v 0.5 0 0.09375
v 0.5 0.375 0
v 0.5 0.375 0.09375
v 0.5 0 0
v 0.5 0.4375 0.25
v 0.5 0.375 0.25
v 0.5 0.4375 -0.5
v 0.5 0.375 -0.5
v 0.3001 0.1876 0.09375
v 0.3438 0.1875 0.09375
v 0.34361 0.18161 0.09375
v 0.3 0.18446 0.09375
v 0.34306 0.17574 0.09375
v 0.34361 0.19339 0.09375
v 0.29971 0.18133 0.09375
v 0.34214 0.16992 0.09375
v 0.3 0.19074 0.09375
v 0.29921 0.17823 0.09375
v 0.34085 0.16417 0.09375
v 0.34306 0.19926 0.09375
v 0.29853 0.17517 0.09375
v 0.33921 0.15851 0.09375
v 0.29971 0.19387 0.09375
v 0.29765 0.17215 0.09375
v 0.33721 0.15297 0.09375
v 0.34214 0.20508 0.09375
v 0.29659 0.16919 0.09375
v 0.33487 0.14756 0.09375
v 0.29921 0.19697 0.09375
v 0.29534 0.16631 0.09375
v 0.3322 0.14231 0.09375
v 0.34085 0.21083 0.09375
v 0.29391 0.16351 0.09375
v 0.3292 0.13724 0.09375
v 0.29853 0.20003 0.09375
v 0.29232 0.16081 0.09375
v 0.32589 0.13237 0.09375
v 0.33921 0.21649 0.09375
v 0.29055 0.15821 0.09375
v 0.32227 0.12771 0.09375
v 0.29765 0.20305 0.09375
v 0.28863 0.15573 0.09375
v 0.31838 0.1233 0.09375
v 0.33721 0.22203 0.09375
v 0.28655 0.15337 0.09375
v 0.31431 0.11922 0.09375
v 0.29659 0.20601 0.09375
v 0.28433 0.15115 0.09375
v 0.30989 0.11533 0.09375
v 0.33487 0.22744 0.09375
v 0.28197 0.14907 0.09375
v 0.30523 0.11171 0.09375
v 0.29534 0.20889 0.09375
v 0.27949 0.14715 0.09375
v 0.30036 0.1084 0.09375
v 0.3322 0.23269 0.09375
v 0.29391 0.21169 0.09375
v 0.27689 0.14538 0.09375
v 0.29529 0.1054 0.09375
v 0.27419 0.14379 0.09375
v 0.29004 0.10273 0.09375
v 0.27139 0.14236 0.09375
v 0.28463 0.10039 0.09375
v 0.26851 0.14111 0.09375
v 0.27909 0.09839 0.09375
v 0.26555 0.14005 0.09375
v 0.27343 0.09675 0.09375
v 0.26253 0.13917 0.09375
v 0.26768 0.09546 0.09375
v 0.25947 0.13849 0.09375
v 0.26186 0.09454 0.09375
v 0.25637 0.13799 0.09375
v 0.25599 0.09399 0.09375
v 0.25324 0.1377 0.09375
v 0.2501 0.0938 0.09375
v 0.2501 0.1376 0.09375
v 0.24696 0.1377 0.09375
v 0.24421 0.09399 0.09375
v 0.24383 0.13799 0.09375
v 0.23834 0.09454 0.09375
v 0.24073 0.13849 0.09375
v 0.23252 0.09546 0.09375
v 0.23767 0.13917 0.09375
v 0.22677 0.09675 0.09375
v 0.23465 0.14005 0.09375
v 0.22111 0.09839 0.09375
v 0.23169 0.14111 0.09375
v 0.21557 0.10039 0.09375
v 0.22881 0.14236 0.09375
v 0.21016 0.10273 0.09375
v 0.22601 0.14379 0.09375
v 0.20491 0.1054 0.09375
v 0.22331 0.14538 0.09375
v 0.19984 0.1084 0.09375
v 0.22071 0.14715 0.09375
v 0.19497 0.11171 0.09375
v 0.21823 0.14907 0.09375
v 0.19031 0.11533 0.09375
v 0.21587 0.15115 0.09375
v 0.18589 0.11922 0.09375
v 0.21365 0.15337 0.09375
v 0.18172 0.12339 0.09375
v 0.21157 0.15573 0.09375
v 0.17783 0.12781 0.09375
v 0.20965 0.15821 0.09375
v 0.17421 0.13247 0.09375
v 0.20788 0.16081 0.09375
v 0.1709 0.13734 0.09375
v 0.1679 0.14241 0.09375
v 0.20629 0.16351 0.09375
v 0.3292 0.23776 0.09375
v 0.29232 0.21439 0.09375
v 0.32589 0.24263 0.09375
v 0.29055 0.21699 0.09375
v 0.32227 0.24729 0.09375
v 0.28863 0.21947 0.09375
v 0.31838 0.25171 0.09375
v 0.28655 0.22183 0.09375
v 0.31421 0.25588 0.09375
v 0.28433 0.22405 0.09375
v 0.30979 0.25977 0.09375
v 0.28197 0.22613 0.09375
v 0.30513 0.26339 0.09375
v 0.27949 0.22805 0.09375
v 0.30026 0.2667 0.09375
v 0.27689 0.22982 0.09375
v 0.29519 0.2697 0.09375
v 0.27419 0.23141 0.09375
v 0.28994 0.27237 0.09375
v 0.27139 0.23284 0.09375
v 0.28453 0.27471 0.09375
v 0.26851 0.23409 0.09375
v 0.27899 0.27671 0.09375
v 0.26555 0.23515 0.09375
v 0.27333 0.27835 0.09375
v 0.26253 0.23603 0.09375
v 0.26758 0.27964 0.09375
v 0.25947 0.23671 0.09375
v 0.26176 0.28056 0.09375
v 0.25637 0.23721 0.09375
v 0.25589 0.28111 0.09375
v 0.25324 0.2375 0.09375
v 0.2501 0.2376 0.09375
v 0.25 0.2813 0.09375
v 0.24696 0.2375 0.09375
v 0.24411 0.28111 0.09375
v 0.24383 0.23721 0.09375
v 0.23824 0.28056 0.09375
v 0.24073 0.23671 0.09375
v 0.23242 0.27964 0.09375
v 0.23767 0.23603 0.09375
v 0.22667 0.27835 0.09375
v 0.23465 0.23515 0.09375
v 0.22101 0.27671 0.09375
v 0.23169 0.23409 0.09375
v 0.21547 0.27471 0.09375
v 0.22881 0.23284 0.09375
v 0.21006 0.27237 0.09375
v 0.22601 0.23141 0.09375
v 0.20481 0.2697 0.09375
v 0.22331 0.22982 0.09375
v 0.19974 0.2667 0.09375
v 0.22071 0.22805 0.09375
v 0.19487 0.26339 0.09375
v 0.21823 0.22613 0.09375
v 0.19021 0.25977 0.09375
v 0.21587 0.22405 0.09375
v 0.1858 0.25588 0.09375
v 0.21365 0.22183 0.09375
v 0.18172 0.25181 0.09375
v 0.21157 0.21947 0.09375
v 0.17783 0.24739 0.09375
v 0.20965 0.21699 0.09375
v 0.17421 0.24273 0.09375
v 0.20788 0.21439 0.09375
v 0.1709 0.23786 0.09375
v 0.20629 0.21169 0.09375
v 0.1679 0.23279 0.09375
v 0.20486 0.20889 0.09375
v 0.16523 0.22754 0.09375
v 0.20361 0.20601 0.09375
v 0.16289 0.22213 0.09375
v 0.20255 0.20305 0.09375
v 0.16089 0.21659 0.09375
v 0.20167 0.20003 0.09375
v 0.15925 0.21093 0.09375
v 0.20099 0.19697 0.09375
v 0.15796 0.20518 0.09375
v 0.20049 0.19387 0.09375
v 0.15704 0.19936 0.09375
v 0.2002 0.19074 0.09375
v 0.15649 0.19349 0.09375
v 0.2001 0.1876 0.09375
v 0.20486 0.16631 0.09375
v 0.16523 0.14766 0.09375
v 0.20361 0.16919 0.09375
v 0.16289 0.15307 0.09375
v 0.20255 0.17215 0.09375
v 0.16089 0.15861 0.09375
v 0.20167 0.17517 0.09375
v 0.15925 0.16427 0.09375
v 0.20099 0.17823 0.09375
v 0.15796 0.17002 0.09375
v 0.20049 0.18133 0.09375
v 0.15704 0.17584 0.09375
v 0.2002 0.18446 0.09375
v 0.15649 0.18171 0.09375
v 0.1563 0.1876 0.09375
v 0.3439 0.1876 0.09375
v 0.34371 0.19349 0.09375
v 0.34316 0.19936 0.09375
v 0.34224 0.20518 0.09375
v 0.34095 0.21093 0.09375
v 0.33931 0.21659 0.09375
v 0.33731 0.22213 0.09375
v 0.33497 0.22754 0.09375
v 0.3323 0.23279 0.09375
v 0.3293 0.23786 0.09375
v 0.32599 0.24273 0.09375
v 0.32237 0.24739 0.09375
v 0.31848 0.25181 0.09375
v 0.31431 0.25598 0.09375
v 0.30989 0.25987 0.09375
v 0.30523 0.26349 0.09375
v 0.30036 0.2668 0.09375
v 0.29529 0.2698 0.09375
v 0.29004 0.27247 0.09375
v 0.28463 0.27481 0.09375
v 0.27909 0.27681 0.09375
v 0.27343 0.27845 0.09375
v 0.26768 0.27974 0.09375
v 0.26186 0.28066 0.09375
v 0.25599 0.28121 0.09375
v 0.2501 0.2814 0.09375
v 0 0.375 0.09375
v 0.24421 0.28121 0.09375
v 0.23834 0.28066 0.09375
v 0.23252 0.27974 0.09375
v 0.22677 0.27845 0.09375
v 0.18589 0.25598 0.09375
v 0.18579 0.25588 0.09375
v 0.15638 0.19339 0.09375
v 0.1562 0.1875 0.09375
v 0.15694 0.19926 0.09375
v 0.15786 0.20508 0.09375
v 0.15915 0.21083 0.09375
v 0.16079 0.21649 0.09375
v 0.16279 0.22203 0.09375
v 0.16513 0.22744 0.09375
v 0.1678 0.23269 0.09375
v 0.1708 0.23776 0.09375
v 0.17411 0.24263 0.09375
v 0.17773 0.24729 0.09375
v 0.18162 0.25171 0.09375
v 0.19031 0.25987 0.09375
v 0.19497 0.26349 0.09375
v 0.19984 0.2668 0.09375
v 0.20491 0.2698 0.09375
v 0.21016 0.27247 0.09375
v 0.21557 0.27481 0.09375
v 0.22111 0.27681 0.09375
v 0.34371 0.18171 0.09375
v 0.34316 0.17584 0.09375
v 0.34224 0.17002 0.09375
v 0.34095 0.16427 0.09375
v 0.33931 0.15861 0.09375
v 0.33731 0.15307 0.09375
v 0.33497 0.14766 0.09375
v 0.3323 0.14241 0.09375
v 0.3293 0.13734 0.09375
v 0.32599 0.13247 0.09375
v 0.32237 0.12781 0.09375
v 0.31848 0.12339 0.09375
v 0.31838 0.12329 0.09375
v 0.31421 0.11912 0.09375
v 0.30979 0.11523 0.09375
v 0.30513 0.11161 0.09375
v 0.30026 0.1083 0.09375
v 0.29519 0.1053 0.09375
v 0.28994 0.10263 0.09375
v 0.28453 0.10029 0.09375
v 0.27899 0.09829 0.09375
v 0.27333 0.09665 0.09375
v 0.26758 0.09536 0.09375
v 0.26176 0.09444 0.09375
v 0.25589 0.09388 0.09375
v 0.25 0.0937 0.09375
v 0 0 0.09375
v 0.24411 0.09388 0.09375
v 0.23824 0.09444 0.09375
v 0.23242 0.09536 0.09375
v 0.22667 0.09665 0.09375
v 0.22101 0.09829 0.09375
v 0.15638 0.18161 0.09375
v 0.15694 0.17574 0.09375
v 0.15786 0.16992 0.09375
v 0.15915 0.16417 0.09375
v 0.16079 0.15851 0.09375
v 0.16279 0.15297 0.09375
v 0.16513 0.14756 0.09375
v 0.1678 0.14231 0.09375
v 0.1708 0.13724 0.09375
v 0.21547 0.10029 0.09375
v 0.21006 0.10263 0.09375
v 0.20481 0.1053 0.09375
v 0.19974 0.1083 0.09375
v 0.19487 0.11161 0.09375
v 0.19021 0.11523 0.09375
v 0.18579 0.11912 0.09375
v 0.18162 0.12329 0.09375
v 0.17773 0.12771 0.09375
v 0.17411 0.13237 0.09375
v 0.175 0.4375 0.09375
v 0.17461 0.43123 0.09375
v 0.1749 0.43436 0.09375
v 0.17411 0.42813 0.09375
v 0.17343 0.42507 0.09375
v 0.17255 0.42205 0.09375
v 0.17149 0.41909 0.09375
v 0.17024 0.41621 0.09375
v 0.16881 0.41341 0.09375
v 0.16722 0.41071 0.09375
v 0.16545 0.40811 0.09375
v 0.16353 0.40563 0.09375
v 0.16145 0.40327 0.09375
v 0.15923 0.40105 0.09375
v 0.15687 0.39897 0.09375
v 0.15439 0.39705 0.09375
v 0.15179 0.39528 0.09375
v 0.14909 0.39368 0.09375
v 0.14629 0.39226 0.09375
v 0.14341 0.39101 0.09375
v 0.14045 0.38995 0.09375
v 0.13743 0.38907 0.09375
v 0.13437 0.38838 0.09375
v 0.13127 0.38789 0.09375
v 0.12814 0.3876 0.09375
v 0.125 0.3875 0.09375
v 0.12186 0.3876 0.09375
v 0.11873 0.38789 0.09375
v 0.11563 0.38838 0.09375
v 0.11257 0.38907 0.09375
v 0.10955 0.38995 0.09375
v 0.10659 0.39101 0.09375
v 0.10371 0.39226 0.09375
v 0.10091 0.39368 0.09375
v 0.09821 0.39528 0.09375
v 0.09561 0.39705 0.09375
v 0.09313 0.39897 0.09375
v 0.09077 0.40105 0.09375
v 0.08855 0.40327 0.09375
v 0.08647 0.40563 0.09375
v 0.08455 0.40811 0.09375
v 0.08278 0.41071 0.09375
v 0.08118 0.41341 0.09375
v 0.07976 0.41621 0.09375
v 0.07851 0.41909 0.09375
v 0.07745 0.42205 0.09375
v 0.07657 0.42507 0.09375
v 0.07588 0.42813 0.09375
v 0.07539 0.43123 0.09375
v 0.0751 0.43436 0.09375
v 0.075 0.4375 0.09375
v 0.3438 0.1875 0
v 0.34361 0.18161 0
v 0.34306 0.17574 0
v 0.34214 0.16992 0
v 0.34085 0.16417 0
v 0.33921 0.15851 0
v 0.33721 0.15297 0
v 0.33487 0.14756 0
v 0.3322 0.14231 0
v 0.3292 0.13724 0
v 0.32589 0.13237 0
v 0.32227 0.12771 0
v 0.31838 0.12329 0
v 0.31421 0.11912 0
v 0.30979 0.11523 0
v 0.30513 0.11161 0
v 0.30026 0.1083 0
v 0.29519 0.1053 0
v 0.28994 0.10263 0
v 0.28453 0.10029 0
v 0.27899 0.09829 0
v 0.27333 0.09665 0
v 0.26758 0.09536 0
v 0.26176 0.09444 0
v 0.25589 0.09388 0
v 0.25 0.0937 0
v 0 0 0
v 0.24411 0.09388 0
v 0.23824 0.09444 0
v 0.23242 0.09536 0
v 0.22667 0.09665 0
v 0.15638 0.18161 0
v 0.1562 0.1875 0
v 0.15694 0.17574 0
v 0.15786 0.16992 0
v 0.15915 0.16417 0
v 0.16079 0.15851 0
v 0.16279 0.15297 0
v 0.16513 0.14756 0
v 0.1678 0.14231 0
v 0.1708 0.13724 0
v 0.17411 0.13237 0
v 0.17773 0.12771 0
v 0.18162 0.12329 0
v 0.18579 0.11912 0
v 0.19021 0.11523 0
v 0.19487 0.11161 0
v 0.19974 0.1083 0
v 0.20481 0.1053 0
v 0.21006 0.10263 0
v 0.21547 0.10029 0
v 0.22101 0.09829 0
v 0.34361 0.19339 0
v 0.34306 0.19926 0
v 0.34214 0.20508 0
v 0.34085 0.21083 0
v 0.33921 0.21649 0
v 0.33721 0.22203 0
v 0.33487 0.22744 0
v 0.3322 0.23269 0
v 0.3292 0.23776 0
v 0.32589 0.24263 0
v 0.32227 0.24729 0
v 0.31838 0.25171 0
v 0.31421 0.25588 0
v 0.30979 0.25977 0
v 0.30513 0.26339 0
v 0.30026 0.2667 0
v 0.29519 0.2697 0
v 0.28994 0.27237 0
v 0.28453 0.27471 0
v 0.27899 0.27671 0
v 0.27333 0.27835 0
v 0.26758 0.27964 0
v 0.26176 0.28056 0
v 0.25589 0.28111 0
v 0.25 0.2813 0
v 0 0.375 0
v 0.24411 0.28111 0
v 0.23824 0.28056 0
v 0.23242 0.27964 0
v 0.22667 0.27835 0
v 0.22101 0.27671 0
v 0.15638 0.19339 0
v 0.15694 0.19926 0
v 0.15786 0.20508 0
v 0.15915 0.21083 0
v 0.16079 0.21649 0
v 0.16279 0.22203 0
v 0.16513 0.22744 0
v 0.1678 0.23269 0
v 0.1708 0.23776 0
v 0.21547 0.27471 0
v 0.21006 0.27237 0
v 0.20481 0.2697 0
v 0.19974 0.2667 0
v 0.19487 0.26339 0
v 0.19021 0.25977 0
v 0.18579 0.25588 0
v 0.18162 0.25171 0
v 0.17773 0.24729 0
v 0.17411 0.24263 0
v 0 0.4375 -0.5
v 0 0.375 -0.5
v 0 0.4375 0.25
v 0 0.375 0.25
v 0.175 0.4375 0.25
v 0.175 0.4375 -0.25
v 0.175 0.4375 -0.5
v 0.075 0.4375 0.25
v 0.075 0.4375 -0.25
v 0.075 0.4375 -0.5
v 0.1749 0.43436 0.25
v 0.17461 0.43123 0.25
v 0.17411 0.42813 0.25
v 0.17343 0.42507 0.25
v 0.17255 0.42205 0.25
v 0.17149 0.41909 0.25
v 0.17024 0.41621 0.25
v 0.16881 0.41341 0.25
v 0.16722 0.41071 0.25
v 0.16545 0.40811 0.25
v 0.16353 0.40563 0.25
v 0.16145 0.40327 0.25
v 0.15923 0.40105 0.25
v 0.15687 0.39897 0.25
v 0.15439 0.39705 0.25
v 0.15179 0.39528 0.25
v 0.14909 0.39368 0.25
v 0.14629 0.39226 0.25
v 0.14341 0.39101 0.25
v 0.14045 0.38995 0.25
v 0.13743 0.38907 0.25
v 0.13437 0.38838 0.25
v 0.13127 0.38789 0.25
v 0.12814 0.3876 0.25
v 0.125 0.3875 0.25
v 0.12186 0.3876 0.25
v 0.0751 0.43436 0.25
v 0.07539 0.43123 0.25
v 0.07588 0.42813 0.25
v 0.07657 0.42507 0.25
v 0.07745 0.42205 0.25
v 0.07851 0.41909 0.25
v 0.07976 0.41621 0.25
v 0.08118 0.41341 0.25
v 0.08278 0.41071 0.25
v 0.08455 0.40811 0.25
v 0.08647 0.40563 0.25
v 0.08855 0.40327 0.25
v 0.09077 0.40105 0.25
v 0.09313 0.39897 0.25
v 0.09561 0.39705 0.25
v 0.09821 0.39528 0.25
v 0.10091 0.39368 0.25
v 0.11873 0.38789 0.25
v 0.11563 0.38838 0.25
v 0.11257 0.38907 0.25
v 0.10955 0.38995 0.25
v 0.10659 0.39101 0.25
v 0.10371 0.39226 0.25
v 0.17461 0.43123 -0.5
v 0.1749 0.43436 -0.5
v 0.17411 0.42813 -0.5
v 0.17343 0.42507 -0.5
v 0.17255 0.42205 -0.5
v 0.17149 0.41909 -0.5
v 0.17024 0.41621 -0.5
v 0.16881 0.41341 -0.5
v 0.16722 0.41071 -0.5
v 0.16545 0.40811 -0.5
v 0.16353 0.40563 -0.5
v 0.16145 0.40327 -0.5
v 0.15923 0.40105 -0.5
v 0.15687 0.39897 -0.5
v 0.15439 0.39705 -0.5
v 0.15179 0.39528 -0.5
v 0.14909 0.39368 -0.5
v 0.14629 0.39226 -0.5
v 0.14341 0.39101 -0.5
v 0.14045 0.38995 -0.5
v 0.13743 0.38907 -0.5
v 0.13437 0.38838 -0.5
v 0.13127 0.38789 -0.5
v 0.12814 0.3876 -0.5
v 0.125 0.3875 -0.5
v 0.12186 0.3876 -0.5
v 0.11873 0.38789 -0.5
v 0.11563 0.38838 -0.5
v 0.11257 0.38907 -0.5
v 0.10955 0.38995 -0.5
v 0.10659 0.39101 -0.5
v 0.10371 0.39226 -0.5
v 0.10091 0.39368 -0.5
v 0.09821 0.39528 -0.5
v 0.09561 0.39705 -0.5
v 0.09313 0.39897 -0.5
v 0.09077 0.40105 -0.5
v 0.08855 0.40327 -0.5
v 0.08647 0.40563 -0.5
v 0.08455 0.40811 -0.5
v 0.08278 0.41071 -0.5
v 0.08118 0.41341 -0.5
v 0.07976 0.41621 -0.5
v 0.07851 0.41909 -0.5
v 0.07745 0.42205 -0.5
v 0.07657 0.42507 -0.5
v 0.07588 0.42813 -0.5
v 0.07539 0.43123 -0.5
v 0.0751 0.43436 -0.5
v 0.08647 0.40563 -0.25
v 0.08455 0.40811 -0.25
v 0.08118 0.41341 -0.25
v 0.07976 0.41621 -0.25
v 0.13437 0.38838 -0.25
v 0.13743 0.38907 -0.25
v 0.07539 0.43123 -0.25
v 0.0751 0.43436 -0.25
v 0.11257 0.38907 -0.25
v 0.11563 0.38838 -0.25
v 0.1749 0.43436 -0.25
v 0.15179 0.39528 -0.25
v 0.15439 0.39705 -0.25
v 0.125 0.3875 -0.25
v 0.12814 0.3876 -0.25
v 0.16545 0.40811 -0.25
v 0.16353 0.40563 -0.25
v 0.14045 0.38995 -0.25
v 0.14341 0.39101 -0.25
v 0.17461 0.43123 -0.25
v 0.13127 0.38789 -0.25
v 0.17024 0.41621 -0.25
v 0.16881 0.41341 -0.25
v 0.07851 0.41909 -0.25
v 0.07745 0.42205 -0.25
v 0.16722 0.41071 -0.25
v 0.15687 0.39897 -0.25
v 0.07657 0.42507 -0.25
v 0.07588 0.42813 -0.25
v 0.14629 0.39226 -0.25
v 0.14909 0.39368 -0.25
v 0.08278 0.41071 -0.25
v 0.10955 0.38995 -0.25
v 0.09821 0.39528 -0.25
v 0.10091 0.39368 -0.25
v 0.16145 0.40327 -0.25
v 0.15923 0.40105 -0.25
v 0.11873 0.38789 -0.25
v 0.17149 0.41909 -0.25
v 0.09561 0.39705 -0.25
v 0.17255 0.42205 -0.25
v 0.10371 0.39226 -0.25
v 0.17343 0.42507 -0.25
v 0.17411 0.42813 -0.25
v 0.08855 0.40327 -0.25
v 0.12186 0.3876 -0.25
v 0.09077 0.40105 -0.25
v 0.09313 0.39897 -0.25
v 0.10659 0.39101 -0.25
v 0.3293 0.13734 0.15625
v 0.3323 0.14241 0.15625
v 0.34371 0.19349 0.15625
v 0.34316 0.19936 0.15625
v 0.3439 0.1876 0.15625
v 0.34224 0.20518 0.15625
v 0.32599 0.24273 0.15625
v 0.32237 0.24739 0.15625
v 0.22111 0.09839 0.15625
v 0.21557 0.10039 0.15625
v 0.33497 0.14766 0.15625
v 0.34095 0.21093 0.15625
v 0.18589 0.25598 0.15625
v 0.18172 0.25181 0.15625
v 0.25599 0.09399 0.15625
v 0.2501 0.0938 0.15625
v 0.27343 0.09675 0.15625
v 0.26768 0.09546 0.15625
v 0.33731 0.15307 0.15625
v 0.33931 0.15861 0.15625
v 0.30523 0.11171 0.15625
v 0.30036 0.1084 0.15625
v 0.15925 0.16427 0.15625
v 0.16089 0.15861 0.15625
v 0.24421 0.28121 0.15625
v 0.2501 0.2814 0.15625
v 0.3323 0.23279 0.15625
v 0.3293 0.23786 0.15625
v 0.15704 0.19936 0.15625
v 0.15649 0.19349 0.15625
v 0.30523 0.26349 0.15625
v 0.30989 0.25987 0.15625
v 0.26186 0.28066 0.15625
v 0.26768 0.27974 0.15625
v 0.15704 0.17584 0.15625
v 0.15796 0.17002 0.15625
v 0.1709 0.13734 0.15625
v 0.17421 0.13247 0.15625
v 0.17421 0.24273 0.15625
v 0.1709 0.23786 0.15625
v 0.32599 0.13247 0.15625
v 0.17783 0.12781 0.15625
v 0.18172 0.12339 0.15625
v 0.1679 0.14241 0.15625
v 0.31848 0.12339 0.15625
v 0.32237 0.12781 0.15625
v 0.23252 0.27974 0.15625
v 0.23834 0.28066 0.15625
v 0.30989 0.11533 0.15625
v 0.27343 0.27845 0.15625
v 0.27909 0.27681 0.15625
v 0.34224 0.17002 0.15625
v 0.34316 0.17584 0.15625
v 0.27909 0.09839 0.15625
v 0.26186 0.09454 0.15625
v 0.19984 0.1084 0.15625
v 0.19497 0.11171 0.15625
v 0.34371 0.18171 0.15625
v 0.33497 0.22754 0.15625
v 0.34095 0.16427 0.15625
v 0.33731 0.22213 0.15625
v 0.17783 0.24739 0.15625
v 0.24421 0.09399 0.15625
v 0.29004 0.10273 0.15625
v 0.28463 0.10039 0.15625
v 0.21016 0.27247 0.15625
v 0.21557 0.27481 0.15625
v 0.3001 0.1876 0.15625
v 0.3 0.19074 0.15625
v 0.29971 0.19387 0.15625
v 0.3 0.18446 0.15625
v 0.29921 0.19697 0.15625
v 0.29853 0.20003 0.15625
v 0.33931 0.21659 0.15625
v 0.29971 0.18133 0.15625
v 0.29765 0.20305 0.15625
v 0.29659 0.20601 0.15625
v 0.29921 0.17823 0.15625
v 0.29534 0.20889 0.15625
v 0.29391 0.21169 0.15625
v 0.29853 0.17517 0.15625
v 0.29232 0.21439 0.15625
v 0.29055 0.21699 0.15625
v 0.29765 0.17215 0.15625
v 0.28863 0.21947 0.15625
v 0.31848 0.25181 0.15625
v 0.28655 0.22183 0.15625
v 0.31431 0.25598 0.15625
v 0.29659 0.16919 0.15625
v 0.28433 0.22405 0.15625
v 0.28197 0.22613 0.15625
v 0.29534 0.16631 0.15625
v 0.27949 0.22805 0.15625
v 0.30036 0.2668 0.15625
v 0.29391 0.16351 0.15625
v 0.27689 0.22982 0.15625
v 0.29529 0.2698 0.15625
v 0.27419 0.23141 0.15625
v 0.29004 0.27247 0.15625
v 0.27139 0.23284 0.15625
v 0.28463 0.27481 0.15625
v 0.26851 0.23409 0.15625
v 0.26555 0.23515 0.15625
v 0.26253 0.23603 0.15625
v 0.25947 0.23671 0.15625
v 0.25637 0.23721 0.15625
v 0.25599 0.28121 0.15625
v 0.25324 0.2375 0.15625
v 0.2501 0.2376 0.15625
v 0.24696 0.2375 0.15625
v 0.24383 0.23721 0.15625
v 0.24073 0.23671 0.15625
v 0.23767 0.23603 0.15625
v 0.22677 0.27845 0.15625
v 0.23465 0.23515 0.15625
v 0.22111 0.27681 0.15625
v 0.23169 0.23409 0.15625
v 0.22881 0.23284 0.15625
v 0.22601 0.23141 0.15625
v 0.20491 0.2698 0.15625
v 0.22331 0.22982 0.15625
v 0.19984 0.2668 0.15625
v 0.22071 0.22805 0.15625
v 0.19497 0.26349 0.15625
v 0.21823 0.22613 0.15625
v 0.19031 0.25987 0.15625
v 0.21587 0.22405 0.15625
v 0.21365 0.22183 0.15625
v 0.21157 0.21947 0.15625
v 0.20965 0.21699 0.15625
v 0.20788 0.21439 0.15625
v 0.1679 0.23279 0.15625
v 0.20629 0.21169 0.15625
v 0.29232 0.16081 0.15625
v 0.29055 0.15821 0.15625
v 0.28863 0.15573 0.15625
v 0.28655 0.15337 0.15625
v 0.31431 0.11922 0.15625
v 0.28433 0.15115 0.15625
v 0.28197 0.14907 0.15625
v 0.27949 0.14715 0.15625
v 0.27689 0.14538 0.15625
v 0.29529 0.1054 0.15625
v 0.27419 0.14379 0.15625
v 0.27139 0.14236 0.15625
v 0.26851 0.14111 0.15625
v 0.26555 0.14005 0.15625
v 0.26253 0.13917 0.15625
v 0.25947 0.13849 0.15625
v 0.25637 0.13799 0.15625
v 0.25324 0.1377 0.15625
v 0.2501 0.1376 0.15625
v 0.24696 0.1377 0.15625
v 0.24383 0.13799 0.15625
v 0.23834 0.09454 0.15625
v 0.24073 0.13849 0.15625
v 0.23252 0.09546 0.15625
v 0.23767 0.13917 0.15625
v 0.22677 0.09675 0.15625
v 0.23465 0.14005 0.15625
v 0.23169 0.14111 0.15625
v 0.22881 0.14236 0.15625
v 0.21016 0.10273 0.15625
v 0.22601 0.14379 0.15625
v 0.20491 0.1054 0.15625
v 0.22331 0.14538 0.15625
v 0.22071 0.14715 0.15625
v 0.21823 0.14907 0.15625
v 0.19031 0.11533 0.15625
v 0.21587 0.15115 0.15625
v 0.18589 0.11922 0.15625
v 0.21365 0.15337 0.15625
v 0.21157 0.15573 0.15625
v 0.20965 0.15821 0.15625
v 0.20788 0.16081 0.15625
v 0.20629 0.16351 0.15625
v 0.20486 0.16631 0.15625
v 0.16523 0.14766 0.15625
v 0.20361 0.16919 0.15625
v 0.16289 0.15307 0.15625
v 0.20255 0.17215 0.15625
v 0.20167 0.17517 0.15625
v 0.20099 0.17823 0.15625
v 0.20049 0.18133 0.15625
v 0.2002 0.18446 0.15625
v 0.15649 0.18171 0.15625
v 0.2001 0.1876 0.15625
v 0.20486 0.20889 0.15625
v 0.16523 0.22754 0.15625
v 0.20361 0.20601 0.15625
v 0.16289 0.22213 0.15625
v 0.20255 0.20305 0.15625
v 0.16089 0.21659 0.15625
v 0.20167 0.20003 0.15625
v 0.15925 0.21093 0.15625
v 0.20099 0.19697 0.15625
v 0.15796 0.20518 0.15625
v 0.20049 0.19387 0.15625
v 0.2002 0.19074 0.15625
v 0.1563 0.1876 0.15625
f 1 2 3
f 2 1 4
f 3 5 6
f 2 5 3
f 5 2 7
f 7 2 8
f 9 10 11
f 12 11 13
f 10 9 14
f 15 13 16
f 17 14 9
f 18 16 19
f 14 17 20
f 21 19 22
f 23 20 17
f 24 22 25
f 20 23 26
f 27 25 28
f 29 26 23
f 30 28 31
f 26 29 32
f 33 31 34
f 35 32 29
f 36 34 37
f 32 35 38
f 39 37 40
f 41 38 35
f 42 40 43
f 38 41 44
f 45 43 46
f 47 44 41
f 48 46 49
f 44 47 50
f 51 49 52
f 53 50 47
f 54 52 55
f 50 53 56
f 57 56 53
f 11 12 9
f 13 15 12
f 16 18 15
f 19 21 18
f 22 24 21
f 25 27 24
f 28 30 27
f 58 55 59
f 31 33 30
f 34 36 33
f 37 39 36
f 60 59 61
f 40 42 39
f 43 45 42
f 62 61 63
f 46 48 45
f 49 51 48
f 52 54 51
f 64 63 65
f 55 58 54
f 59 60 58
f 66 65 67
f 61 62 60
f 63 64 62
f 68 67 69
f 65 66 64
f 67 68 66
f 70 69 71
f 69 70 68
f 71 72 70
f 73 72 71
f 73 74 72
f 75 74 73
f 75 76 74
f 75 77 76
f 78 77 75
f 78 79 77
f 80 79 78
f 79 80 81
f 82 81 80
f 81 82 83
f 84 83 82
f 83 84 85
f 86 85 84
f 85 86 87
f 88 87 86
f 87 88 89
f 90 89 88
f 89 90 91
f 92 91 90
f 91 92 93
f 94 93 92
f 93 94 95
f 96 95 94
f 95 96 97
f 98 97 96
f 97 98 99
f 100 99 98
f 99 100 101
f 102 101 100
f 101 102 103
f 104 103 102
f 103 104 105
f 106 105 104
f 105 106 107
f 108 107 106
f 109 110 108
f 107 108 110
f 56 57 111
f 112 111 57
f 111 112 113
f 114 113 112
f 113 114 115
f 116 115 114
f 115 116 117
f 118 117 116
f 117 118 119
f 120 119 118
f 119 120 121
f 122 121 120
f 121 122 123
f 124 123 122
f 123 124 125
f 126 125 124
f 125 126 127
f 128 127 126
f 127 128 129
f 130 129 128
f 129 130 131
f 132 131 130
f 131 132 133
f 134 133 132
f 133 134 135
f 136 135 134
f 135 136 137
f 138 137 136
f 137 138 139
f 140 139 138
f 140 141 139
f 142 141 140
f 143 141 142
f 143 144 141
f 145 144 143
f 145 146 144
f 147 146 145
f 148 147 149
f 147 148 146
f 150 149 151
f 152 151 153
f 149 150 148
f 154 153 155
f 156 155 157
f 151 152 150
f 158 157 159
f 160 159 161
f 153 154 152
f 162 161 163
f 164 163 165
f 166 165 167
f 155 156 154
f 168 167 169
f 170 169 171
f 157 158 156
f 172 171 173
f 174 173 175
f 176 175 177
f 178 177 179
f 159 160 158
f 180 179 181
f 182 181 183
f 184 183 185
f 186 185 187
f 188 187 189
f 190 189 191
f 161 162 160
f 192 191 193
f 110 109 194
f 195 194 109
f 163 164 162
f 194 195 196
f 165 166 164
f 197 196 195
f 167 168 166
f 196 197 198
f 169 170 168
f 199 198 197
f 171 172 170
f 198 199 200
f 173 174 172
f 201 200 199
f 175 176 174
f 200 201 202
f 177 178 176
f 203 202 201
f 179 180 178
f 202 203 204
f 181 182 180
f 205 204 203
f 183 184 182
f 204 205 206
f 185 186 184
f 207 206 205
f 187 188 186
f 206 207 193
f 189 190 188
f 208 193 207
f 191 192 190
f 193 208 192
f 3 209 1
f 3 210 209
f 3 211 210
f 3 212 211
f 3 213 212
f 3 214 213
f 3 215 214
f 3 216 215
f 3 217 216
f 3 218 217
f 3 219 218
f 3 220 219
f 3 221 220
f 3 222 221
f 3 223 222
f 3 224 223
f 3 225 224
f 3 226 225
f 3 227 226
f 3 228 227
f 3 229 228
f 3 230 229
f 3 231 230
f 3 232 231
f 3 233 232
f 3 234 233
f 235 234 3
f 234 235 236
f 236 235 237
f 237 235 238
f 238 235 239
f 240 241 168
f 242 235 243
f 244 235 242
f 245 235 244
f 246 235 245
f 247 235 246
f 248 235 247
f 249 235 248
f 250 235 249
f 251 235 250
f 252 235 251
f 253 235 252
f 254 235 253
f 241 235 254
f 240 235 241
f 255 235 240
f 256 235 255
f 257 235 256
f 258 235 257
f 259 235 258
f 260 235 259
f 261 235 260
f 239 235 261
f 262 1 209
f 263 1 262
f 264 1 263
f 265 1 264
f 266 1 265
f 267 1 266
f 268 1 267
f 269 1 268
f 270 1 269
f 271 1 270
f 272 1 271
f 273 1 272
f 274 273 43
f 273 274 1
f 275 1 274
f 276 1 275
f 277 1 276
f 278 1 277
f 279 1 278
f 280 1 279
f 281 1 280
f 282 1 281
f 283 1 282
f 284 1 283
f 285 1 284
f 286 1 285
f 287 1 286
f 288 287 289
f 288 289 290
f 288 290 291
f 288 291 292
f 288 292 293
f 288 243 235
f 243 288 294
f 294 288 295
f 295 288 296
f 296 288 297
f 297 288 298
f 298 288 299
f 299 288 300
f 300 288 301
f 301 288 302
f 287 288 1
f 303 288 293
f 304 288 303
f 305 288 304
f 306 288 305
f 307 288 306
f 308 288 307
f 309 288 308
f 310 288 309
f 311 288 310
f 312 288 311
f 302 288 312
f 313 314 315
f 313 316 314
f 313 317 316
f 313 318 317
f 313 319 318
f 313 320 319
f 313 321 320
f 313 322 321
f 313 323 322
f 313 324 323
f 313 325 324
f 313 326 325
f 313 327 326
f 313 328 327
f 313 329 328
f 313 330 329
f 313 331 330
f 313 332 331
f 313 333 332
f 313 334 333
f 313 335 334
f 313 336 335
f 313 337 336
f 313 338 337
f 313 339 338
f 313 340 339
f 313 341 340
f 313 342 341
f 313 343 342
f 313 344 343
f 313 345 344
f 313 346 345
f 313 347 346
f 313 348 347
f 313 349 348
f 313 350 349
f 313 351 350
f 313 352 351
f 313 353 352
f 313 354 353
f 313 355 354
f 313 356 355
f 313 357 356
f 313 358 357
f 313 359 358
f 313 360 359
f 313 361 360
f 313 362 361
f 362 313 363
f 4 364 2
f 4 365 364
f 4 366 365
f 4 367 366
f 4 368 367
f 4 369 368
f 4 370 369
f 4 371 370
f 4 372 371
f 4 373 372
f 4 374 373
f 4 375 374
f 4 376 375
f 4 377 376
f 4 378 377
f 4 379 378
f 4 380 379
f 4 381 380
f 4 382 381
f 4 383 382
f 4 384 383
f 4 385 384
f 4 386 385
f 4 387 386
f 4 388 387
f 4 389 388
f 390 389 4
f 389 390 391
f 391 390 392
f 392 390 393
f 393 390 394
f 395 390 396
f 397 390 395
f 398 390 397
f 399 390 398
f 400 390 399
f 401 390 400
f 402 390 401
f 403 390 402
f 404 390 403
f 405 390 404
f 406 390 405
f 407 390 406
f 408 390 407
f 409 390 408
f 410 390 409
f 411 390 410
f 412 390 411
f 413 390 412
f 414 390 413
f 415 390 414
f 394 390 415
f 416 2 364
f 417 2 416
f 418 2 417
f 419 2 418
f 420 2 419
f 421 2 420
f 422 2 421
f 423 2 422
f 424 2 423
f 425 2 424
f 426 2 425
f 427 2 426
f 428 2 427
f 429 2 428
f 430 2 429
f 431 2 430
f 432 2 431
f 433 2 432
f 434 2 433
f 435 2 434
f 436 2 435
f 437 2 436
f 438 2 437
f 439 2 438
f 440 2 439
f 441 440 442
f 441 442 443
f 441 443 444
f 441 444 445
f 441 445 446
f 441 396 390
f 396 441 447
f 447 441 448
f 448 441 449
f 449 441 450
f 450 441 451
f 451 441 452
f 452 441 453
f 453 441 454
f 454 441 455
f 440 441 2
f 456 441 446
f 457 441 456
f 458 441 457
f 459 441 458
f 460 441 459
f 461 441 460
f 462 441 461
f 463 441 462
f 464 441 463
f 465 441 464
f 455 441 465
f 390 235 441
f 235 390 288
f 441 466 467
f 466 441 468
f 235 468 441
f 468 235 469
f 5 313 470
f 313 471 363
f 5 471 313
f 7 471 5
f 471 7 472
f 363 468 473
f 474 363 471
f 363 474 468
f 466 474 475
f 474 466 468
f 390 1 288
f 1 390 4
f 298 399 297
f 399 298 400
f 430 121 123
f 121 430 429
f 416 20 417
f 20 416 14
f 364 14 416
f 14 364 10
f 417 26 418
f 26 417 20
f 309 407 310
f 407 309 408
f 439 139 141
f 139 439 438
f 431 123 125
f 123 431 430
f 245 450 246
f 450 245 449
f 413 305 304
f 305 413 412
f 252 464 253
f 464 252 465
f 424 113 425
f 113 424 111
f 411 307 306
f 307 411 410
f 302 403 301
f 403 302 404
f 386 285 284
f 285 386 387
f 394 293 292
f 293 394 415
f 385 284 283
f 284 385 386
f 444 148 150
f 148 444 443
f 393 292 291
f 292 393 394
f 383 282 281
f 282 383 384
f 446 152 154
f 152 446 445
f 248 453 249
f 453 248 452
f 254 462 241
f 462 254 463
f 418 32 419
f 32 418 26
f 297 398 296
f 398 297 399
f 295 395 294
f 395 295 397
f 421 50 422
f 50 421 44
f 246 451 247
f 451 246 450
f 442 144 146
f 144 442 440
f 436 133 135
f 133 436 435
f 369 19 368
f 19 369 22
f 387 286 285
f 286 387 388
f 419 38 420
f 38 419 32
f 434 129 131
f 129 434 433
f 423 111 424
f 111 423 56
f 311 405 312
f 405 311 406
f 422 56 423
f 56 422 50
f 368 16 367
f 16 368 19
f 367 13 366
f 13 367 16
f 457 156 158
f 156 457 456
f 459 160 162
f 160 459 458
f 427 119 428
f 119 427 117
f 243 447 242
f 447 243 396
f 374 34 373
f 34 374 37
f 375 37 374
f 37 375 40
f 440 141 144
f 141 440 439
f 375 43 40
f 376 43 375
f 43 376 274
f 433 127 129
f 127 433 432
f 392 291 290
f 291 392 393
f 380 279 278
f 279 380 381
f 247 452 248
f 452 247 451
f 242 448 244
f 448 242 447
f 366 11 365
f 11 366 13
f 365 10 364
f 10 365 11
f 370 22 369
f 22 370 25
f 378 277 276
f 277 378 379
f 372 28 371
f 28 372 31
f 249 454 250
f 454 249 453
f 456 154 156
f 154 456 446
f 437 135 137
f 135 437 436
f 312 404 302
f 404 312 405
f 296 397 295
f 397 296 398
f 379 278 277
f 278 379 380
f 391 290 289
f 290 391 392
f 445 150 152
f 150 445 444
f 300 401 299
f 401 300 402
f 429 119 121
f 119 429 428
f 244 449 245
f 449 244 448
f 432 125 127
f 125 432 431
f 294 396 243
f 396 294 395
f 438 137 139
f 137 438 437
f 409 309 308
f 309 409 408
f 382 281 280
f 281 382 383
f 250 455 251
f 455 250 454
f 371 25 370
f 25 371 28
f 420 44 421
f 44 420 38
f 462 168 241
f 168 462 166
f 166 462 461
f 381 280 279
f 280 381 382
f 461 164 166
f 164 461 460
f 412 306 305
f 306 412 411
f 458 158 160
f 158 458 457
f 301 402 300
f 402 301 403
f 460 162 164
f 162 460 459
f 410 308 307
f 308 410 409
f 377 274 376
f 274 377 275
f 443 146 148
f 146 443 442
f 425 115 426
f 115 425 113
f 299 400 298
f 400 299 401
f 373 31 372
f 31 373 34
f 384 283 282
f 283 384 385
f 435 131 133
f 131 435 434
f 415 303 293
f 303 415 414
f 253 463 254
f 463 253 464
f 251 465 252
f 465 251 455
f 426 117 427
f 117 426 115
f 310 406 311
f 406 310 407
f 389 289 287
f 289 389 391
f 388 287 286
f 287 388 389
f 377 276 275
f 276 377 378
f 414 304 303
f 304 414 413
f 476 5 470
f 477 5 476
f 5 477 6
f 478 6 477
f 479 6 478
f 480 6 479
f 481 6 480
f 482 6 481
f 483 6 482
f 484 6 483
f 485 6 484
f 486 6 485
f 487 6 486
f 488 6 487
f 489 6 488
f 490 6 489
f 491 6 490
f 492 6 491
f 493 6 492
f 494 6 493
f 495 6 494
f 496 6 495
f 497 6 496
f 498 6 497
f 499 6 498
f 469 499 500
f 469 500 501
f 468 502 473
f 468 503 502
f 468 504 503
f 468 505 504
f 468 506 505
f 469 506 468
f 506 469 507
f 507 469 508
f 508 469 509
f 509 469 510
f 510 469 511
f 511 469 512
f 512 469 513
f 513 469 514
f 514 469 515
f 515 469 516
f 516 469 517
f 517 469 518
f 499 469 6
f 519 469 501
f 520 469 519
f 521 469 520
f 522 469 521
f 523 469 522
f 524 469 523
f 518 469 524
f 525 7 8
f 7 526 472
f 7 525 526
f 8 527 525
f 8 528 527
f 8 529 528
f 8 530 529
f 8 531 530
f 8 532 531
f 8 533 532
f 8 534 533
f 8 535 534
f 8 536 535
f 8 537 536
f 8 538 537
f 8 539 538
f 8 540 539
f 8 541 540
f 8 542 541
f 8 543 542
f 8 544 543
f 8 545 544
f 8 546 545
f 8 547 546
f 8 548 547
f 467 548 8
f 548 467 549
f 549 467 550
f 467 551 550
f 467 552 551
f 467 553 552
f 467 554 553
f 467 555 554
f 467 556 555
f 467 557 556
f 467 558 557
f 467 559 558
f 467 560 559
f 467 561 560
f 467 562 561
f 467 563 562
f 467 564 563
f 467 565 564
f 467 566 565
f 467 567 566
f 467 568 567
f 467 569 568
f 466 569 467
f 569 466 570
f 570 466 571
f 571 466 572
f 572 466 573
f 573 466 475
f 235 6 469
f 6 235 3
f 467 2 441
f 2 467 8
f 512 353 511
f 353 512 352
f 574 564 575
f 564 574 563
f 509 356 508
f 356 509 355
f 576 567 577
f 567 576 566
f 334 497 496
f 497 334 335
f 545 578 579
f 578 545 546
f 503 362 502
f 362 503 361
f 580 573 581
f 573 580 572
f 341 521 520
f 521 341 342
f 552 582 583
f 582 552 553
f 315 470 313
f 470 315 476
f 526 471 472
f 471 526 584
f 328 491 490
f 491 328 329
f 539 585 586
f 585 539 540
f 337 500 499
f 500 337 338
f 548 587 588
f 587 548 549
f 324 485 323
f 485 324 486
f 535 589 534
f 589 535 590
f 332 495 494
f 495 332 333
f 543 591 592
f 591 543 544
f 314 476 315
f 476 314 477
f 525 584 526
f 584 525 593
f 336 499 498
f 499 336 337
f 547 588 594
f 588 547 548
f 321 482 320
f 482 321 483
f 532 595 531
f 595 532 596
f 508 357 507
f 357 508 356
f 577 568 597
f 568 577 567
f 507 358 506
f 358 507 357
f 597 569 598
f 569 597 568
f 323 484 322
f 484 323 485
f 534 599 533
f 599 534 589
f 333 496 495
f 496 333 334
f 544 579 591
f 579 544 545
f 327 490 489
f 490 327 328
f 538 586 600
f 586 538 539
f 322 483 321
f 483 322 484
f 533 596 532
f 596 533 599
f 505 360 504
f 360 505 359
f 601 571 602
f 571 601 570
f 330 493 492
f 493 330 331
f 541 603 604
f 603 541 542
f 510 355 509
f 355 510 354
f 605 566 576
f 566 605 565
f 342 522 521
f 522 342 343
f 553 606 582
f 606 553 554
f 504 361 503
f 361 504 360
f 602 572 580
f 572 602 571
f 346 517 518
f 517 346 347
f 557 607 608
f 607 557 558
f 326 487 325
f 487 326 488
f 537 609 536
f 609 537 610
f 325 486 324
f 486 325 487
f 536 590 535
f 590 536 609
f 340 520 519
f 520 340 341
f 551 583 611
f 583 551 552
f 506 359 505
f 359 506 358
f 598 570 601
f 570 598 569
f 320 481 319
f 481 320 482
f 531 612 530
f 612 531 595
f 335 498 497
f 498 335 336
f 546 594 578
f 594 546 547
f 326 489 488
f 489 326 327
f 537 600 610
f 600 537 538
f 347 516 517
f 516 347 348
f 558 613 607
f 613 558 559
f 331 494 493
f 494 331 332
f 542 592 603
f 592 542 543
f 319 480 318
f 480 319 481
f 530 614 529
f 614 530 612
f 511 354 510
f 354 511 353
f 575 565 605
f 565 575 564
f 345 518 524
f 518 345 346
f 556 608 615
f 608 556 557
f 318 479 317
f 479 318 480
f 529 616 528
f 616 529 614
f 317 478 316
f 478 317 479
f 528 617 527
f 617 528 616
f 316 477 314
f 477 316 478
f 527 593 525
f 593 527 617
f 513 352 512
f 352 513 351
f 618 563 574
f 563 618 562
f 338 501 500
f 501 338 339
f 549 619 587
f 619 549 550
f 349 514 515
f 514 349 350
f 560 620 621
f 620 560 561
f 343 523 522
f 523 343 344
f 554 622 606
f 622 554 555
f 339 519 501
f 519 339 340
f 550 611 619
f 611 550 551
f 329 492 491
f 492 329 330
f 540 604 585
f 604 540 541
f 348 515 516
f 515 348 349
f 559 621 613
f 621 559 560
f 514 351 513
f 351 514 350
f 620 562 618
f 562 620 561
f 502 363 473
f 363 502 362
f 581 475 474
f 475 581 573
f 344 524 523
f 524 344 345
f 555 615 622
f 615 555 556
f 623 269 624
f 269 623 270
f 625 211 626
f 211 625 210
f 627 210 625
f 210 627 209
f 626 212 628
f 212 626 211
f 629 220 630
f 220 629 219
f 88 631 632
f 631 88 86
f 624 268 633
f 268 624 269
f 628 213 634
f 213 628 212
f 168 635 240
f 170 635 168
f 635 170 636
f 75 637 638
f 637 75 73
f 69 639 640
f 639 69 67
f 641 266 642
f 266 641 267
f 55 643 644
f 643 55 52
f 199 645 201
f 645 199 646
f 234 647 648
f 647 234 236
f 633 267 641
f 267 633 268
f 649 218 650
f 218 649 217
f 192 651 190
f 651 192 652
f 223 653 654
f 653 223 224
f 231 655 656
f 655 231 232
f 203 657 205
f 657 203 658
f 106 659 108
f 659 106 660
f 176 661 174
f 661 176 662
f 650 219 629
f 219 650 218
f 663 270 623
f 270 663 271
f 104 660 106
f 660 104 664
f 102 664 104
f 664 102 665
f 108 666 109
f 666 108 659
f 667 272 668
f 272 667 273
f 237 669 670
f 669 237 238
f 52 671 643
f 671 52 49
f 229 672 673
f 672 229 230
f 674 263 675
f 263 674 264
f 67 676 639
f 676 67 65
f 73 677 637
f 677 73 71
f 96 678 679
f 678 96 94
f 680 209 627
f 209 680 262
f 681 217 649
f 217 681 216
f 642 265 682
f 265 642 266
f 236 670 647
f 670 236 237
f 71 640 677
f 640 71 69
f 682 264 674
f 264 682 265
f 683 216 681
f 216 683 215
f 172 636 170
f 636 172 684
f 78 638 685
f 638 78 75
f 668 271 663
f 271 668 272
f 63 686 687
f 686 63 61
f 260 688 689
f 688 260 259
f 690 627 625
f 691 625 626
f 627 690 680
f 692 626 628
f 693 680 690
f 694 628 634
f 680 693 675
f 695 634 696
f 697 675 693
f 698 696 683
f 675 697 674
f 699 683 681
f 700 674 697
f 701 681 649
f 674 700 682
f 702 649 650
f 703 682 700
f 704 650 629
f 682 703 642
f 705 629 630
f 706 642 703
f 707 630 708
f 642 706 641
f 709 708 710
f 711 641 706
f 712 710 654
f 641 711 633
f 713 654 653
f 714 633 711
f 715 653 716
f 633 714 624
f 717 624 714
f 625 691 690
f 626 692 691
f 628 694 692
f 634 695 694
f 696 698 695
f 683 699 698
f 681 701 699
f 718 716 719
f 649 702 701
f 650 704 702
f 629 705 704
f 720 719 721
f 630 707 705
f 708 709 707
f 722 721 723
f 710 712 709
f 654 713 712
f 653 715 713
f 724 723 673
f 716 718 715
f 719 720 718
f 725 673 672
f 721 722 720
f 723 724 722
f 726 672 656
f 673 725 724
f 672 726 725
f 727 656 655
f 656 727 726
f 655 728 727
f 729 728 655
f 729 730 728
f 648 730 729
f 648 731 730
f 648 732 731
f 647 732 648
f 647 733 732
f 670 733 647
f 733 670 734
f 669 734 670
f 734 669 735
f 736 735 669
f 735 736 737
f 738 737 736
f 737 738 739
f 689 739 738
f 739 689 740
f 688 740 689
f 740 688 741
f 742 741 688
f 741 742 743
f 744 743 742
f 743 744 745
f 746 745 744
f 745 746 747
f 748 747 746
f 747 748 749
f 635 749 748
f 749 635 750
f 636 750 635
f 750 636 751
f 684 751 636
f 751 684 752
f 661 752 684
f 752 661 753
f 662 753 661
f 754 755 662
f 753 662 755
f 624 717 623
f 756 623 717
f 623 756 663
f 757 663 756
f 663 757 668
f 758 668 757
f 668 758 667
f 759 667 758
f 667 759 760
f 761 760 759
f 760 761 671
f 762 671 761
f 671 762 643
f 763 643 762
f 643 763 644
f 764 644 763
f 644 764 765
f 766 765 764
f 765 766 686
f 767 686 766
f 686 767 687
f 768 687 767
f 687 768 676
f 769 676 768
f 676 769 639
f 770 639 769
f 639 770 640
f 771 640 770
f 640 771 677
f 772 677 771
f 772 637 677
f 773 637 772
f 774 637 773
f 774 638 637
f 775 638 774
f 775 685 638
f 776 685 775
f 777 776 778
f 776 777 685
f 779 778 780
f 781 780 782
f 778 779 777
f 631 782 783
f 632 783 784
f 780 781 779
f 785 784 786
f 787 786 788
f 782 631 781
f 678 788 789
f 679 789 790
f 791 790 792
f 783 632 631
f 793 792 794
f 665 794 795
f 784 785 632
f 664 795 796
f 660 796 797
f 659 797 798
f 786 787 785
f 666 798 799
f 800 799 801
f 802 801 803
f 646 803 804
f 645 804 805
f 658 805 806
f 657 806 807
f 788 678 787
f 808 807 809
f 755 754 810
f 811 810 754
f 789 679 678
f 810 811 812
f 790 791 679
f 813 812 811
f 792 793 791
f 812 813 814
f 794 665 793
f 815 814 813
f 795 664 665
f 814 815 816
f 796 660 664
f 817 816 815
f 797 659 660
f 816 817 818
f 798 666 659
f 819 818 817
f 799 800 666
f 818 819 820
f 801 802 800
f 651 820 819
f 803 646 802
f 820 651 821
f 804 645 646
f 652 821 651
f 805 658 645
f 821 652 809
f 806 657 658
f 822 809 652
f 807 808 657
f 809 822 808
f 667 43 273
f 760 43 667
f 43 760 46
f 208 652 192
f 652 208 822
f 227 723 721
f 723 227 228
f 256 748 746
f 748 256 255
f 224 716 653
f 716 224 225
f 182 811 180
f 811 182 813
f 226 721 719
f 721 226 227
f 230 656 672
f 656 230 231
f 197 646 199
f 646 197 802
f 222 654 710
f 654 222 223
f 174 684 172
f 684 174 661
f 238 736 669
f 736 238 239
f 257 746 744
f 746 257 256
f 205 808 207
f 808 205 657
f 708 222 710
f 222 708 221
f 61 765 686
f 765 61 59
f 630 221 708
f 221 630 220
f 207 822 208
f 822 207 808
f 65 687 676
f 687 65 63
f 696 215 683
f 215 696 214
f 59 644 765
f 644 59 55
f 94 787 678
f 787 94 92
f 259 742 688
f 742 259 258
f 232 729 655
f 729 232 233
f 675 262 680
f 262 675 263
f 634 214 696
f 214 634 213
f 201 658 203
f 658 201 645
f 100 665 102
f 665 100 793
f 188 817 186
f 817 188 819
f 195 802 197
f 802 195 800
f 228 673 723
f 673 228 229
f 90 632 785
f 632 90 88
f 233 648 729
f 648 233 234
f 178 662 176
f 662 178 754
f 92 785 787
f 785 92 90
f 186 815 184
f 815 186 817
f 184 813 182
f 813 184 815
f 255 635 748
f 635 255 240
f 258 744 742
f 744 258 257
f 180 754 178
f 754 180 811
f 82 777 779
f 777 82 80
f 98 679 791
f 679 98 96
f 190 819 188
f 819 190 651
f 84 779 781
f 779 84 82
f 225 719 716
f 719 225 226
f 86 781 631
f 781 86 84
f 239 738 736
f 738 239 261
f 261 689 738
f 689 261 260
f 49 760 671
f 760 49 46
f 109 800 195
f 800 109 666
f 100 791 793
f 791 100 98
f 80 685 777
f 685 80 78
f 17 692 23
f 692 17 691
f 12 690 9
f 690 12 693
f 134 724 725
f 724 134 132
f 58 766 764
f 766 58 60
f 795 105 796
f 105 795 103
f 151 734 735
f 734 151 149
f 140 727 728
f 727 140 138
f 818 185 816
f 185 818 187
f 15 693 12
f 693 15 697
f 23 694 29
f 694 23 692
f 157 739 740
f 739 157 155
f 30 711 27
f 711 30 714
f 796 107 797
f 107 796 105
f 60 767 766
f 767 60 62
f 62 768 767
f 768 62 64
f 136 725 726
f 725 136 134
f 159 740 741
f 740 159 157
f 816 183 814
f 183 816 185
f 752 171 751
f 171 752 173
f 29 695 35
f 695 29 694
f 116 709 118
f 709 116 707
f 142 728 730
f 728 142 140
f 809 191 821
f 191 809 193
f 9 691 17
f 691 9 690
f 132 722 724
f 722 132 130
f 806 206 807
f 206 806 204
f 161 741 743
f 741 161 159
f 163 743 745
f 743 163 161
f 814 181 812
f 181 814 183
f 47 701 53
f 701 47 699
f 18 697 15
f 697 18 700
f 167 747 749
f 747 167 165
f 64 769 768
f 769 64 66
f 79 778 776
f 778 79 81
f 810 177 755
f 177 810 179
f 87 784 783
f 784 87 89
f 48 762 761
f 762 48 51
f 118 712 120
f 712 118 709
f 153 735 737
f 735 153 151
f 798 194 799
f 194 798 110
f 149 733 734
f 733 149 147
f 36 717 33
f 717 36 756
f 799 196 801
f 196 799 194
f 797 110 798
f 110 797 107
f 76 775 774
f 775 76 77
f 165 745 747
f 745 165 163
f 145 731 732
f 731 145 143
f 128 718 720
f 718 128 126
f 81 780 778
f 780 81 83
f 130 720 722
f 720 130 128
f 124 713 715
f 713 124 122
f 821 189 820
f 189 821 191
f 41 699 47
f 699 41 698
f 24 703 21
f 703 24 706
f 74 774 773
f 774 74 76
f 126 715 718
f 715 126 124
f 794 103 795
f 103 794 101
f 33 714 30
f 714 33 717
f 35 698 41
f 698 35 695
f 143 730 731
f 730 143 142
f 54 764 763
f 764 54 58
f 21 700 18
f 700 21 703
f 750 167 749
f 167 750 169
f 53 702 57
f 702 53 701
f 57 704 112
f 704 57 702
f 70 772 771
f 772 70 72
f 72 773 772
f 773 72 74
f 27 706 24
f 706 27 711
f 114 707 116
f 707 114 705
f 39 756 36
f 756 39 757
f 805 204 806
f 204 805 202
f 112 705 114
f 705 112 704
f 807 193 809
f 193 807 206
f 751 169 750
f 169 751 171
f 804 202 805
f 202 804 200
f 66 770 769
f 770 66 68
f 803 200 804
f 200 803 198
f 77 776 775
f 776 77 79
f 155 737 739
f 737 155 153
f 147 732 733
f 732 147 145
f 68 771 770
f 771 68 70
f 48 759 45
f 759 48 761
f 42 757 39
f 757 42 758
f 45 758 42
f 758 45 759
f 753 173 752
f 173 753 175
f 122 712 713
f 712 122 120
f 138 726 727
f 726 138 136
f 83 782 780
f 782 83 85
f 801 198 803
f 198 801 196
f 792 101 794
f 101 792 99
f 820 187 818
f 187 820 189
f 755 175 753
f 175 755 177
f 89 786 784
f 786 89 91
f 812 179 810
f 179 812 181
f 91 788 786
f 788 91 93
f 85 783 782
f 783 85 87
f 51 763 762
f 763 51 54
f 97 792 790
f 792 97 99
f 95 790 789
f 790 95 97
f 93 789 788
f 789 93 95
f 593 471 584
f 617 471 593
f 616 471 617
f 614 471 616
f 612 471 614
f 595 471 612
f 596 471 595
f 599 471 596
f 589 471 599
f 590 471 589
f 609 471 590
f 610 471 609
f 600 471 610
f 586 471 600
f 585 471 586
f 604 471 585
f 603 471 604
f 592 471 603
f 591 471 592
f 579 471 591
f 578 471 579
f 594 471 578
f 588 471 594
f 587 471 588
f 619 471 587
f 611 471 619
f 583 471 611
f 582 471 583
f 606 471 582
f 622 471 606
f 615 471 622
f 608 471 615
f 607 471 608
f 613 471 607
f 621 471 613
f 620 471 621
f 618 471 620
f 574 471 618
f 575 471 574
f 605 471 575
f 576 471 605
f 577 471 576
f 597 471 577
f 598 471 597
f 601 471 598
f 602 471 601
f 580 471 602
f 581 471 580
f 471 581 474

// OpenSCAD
// === Parametric Dimensions ===

// Main rectangular base
base_length = 0.5;
base_width = 0.4375;
base_height = 0.09375;

// Circular void through base
base_void_cx = 0.25;
base_void_cy = 0.1875;
base_void_r = 0.0938;

// Back-edge strip common footprint
strip_x = 0.5;
strip_y = 0.0625;
strip_front_y = 0.375;

// Lower back-edge strip (below base underside)
lower_strip_depth = 0.25;

// Upper back-edge strip (spans below and above base underside)
upper_strip_below = 0.5;
upper_strip_above = 0.25;

// Circular void in upper strip
upper_void_cx = 0.125;
upper_void_cy = 0.4375;
upper_void_r = 0.05;

// Annular collar on top of base
collar_cx = 0.2501;
collar_cy = 0.1876;
collar_outer_r = 0.0938;
collar_inner_r = 0.05;
collar_height = 0.0625;

$fn = 100;

// === Main Model ===

union() {

    // 1. Main base with through-hole void
    difference() {
        cube([base_length, base_width, base_height]);
        translate([base_void_cx, base_void_cy, -0.005])
            cylinder(h=base_height + 0.01, r=base_void_r);
    }

    // 2. Lower back-edge solid strip (base underside down to -0.25)
    translate([0, strip_front_y, -lower_strip_depth])
        cube([strip_x, strip_y, lower_strip_depth]);

    // 3. Upper back-edge strip with circular void (-0.5 to +0.25)
    difference() {
        translate([0, strip_front_y, -upper_strip_below])
            cube([strip_x, strip_y, upper_strip_below + upper_strip_above]);
        translate([upper_void_cx, upper_void_cy, -upper_strip_below - 0.005])
            cylinder(h=upper_strip_below + upper_strip_above + 0.01, r=upper_void_r);
    }

    // 4. Annular collar concentric with base void, on top surface
    translate([collar_cx, collar_cy, base_height])
        difference() {
            cylinder(h=collar_height, r=collar_outer_r);
            translate([0, 0, -0.005])
                cylinder(h=collar_height + 0.01, r=collar_inner_r);
        }

}
